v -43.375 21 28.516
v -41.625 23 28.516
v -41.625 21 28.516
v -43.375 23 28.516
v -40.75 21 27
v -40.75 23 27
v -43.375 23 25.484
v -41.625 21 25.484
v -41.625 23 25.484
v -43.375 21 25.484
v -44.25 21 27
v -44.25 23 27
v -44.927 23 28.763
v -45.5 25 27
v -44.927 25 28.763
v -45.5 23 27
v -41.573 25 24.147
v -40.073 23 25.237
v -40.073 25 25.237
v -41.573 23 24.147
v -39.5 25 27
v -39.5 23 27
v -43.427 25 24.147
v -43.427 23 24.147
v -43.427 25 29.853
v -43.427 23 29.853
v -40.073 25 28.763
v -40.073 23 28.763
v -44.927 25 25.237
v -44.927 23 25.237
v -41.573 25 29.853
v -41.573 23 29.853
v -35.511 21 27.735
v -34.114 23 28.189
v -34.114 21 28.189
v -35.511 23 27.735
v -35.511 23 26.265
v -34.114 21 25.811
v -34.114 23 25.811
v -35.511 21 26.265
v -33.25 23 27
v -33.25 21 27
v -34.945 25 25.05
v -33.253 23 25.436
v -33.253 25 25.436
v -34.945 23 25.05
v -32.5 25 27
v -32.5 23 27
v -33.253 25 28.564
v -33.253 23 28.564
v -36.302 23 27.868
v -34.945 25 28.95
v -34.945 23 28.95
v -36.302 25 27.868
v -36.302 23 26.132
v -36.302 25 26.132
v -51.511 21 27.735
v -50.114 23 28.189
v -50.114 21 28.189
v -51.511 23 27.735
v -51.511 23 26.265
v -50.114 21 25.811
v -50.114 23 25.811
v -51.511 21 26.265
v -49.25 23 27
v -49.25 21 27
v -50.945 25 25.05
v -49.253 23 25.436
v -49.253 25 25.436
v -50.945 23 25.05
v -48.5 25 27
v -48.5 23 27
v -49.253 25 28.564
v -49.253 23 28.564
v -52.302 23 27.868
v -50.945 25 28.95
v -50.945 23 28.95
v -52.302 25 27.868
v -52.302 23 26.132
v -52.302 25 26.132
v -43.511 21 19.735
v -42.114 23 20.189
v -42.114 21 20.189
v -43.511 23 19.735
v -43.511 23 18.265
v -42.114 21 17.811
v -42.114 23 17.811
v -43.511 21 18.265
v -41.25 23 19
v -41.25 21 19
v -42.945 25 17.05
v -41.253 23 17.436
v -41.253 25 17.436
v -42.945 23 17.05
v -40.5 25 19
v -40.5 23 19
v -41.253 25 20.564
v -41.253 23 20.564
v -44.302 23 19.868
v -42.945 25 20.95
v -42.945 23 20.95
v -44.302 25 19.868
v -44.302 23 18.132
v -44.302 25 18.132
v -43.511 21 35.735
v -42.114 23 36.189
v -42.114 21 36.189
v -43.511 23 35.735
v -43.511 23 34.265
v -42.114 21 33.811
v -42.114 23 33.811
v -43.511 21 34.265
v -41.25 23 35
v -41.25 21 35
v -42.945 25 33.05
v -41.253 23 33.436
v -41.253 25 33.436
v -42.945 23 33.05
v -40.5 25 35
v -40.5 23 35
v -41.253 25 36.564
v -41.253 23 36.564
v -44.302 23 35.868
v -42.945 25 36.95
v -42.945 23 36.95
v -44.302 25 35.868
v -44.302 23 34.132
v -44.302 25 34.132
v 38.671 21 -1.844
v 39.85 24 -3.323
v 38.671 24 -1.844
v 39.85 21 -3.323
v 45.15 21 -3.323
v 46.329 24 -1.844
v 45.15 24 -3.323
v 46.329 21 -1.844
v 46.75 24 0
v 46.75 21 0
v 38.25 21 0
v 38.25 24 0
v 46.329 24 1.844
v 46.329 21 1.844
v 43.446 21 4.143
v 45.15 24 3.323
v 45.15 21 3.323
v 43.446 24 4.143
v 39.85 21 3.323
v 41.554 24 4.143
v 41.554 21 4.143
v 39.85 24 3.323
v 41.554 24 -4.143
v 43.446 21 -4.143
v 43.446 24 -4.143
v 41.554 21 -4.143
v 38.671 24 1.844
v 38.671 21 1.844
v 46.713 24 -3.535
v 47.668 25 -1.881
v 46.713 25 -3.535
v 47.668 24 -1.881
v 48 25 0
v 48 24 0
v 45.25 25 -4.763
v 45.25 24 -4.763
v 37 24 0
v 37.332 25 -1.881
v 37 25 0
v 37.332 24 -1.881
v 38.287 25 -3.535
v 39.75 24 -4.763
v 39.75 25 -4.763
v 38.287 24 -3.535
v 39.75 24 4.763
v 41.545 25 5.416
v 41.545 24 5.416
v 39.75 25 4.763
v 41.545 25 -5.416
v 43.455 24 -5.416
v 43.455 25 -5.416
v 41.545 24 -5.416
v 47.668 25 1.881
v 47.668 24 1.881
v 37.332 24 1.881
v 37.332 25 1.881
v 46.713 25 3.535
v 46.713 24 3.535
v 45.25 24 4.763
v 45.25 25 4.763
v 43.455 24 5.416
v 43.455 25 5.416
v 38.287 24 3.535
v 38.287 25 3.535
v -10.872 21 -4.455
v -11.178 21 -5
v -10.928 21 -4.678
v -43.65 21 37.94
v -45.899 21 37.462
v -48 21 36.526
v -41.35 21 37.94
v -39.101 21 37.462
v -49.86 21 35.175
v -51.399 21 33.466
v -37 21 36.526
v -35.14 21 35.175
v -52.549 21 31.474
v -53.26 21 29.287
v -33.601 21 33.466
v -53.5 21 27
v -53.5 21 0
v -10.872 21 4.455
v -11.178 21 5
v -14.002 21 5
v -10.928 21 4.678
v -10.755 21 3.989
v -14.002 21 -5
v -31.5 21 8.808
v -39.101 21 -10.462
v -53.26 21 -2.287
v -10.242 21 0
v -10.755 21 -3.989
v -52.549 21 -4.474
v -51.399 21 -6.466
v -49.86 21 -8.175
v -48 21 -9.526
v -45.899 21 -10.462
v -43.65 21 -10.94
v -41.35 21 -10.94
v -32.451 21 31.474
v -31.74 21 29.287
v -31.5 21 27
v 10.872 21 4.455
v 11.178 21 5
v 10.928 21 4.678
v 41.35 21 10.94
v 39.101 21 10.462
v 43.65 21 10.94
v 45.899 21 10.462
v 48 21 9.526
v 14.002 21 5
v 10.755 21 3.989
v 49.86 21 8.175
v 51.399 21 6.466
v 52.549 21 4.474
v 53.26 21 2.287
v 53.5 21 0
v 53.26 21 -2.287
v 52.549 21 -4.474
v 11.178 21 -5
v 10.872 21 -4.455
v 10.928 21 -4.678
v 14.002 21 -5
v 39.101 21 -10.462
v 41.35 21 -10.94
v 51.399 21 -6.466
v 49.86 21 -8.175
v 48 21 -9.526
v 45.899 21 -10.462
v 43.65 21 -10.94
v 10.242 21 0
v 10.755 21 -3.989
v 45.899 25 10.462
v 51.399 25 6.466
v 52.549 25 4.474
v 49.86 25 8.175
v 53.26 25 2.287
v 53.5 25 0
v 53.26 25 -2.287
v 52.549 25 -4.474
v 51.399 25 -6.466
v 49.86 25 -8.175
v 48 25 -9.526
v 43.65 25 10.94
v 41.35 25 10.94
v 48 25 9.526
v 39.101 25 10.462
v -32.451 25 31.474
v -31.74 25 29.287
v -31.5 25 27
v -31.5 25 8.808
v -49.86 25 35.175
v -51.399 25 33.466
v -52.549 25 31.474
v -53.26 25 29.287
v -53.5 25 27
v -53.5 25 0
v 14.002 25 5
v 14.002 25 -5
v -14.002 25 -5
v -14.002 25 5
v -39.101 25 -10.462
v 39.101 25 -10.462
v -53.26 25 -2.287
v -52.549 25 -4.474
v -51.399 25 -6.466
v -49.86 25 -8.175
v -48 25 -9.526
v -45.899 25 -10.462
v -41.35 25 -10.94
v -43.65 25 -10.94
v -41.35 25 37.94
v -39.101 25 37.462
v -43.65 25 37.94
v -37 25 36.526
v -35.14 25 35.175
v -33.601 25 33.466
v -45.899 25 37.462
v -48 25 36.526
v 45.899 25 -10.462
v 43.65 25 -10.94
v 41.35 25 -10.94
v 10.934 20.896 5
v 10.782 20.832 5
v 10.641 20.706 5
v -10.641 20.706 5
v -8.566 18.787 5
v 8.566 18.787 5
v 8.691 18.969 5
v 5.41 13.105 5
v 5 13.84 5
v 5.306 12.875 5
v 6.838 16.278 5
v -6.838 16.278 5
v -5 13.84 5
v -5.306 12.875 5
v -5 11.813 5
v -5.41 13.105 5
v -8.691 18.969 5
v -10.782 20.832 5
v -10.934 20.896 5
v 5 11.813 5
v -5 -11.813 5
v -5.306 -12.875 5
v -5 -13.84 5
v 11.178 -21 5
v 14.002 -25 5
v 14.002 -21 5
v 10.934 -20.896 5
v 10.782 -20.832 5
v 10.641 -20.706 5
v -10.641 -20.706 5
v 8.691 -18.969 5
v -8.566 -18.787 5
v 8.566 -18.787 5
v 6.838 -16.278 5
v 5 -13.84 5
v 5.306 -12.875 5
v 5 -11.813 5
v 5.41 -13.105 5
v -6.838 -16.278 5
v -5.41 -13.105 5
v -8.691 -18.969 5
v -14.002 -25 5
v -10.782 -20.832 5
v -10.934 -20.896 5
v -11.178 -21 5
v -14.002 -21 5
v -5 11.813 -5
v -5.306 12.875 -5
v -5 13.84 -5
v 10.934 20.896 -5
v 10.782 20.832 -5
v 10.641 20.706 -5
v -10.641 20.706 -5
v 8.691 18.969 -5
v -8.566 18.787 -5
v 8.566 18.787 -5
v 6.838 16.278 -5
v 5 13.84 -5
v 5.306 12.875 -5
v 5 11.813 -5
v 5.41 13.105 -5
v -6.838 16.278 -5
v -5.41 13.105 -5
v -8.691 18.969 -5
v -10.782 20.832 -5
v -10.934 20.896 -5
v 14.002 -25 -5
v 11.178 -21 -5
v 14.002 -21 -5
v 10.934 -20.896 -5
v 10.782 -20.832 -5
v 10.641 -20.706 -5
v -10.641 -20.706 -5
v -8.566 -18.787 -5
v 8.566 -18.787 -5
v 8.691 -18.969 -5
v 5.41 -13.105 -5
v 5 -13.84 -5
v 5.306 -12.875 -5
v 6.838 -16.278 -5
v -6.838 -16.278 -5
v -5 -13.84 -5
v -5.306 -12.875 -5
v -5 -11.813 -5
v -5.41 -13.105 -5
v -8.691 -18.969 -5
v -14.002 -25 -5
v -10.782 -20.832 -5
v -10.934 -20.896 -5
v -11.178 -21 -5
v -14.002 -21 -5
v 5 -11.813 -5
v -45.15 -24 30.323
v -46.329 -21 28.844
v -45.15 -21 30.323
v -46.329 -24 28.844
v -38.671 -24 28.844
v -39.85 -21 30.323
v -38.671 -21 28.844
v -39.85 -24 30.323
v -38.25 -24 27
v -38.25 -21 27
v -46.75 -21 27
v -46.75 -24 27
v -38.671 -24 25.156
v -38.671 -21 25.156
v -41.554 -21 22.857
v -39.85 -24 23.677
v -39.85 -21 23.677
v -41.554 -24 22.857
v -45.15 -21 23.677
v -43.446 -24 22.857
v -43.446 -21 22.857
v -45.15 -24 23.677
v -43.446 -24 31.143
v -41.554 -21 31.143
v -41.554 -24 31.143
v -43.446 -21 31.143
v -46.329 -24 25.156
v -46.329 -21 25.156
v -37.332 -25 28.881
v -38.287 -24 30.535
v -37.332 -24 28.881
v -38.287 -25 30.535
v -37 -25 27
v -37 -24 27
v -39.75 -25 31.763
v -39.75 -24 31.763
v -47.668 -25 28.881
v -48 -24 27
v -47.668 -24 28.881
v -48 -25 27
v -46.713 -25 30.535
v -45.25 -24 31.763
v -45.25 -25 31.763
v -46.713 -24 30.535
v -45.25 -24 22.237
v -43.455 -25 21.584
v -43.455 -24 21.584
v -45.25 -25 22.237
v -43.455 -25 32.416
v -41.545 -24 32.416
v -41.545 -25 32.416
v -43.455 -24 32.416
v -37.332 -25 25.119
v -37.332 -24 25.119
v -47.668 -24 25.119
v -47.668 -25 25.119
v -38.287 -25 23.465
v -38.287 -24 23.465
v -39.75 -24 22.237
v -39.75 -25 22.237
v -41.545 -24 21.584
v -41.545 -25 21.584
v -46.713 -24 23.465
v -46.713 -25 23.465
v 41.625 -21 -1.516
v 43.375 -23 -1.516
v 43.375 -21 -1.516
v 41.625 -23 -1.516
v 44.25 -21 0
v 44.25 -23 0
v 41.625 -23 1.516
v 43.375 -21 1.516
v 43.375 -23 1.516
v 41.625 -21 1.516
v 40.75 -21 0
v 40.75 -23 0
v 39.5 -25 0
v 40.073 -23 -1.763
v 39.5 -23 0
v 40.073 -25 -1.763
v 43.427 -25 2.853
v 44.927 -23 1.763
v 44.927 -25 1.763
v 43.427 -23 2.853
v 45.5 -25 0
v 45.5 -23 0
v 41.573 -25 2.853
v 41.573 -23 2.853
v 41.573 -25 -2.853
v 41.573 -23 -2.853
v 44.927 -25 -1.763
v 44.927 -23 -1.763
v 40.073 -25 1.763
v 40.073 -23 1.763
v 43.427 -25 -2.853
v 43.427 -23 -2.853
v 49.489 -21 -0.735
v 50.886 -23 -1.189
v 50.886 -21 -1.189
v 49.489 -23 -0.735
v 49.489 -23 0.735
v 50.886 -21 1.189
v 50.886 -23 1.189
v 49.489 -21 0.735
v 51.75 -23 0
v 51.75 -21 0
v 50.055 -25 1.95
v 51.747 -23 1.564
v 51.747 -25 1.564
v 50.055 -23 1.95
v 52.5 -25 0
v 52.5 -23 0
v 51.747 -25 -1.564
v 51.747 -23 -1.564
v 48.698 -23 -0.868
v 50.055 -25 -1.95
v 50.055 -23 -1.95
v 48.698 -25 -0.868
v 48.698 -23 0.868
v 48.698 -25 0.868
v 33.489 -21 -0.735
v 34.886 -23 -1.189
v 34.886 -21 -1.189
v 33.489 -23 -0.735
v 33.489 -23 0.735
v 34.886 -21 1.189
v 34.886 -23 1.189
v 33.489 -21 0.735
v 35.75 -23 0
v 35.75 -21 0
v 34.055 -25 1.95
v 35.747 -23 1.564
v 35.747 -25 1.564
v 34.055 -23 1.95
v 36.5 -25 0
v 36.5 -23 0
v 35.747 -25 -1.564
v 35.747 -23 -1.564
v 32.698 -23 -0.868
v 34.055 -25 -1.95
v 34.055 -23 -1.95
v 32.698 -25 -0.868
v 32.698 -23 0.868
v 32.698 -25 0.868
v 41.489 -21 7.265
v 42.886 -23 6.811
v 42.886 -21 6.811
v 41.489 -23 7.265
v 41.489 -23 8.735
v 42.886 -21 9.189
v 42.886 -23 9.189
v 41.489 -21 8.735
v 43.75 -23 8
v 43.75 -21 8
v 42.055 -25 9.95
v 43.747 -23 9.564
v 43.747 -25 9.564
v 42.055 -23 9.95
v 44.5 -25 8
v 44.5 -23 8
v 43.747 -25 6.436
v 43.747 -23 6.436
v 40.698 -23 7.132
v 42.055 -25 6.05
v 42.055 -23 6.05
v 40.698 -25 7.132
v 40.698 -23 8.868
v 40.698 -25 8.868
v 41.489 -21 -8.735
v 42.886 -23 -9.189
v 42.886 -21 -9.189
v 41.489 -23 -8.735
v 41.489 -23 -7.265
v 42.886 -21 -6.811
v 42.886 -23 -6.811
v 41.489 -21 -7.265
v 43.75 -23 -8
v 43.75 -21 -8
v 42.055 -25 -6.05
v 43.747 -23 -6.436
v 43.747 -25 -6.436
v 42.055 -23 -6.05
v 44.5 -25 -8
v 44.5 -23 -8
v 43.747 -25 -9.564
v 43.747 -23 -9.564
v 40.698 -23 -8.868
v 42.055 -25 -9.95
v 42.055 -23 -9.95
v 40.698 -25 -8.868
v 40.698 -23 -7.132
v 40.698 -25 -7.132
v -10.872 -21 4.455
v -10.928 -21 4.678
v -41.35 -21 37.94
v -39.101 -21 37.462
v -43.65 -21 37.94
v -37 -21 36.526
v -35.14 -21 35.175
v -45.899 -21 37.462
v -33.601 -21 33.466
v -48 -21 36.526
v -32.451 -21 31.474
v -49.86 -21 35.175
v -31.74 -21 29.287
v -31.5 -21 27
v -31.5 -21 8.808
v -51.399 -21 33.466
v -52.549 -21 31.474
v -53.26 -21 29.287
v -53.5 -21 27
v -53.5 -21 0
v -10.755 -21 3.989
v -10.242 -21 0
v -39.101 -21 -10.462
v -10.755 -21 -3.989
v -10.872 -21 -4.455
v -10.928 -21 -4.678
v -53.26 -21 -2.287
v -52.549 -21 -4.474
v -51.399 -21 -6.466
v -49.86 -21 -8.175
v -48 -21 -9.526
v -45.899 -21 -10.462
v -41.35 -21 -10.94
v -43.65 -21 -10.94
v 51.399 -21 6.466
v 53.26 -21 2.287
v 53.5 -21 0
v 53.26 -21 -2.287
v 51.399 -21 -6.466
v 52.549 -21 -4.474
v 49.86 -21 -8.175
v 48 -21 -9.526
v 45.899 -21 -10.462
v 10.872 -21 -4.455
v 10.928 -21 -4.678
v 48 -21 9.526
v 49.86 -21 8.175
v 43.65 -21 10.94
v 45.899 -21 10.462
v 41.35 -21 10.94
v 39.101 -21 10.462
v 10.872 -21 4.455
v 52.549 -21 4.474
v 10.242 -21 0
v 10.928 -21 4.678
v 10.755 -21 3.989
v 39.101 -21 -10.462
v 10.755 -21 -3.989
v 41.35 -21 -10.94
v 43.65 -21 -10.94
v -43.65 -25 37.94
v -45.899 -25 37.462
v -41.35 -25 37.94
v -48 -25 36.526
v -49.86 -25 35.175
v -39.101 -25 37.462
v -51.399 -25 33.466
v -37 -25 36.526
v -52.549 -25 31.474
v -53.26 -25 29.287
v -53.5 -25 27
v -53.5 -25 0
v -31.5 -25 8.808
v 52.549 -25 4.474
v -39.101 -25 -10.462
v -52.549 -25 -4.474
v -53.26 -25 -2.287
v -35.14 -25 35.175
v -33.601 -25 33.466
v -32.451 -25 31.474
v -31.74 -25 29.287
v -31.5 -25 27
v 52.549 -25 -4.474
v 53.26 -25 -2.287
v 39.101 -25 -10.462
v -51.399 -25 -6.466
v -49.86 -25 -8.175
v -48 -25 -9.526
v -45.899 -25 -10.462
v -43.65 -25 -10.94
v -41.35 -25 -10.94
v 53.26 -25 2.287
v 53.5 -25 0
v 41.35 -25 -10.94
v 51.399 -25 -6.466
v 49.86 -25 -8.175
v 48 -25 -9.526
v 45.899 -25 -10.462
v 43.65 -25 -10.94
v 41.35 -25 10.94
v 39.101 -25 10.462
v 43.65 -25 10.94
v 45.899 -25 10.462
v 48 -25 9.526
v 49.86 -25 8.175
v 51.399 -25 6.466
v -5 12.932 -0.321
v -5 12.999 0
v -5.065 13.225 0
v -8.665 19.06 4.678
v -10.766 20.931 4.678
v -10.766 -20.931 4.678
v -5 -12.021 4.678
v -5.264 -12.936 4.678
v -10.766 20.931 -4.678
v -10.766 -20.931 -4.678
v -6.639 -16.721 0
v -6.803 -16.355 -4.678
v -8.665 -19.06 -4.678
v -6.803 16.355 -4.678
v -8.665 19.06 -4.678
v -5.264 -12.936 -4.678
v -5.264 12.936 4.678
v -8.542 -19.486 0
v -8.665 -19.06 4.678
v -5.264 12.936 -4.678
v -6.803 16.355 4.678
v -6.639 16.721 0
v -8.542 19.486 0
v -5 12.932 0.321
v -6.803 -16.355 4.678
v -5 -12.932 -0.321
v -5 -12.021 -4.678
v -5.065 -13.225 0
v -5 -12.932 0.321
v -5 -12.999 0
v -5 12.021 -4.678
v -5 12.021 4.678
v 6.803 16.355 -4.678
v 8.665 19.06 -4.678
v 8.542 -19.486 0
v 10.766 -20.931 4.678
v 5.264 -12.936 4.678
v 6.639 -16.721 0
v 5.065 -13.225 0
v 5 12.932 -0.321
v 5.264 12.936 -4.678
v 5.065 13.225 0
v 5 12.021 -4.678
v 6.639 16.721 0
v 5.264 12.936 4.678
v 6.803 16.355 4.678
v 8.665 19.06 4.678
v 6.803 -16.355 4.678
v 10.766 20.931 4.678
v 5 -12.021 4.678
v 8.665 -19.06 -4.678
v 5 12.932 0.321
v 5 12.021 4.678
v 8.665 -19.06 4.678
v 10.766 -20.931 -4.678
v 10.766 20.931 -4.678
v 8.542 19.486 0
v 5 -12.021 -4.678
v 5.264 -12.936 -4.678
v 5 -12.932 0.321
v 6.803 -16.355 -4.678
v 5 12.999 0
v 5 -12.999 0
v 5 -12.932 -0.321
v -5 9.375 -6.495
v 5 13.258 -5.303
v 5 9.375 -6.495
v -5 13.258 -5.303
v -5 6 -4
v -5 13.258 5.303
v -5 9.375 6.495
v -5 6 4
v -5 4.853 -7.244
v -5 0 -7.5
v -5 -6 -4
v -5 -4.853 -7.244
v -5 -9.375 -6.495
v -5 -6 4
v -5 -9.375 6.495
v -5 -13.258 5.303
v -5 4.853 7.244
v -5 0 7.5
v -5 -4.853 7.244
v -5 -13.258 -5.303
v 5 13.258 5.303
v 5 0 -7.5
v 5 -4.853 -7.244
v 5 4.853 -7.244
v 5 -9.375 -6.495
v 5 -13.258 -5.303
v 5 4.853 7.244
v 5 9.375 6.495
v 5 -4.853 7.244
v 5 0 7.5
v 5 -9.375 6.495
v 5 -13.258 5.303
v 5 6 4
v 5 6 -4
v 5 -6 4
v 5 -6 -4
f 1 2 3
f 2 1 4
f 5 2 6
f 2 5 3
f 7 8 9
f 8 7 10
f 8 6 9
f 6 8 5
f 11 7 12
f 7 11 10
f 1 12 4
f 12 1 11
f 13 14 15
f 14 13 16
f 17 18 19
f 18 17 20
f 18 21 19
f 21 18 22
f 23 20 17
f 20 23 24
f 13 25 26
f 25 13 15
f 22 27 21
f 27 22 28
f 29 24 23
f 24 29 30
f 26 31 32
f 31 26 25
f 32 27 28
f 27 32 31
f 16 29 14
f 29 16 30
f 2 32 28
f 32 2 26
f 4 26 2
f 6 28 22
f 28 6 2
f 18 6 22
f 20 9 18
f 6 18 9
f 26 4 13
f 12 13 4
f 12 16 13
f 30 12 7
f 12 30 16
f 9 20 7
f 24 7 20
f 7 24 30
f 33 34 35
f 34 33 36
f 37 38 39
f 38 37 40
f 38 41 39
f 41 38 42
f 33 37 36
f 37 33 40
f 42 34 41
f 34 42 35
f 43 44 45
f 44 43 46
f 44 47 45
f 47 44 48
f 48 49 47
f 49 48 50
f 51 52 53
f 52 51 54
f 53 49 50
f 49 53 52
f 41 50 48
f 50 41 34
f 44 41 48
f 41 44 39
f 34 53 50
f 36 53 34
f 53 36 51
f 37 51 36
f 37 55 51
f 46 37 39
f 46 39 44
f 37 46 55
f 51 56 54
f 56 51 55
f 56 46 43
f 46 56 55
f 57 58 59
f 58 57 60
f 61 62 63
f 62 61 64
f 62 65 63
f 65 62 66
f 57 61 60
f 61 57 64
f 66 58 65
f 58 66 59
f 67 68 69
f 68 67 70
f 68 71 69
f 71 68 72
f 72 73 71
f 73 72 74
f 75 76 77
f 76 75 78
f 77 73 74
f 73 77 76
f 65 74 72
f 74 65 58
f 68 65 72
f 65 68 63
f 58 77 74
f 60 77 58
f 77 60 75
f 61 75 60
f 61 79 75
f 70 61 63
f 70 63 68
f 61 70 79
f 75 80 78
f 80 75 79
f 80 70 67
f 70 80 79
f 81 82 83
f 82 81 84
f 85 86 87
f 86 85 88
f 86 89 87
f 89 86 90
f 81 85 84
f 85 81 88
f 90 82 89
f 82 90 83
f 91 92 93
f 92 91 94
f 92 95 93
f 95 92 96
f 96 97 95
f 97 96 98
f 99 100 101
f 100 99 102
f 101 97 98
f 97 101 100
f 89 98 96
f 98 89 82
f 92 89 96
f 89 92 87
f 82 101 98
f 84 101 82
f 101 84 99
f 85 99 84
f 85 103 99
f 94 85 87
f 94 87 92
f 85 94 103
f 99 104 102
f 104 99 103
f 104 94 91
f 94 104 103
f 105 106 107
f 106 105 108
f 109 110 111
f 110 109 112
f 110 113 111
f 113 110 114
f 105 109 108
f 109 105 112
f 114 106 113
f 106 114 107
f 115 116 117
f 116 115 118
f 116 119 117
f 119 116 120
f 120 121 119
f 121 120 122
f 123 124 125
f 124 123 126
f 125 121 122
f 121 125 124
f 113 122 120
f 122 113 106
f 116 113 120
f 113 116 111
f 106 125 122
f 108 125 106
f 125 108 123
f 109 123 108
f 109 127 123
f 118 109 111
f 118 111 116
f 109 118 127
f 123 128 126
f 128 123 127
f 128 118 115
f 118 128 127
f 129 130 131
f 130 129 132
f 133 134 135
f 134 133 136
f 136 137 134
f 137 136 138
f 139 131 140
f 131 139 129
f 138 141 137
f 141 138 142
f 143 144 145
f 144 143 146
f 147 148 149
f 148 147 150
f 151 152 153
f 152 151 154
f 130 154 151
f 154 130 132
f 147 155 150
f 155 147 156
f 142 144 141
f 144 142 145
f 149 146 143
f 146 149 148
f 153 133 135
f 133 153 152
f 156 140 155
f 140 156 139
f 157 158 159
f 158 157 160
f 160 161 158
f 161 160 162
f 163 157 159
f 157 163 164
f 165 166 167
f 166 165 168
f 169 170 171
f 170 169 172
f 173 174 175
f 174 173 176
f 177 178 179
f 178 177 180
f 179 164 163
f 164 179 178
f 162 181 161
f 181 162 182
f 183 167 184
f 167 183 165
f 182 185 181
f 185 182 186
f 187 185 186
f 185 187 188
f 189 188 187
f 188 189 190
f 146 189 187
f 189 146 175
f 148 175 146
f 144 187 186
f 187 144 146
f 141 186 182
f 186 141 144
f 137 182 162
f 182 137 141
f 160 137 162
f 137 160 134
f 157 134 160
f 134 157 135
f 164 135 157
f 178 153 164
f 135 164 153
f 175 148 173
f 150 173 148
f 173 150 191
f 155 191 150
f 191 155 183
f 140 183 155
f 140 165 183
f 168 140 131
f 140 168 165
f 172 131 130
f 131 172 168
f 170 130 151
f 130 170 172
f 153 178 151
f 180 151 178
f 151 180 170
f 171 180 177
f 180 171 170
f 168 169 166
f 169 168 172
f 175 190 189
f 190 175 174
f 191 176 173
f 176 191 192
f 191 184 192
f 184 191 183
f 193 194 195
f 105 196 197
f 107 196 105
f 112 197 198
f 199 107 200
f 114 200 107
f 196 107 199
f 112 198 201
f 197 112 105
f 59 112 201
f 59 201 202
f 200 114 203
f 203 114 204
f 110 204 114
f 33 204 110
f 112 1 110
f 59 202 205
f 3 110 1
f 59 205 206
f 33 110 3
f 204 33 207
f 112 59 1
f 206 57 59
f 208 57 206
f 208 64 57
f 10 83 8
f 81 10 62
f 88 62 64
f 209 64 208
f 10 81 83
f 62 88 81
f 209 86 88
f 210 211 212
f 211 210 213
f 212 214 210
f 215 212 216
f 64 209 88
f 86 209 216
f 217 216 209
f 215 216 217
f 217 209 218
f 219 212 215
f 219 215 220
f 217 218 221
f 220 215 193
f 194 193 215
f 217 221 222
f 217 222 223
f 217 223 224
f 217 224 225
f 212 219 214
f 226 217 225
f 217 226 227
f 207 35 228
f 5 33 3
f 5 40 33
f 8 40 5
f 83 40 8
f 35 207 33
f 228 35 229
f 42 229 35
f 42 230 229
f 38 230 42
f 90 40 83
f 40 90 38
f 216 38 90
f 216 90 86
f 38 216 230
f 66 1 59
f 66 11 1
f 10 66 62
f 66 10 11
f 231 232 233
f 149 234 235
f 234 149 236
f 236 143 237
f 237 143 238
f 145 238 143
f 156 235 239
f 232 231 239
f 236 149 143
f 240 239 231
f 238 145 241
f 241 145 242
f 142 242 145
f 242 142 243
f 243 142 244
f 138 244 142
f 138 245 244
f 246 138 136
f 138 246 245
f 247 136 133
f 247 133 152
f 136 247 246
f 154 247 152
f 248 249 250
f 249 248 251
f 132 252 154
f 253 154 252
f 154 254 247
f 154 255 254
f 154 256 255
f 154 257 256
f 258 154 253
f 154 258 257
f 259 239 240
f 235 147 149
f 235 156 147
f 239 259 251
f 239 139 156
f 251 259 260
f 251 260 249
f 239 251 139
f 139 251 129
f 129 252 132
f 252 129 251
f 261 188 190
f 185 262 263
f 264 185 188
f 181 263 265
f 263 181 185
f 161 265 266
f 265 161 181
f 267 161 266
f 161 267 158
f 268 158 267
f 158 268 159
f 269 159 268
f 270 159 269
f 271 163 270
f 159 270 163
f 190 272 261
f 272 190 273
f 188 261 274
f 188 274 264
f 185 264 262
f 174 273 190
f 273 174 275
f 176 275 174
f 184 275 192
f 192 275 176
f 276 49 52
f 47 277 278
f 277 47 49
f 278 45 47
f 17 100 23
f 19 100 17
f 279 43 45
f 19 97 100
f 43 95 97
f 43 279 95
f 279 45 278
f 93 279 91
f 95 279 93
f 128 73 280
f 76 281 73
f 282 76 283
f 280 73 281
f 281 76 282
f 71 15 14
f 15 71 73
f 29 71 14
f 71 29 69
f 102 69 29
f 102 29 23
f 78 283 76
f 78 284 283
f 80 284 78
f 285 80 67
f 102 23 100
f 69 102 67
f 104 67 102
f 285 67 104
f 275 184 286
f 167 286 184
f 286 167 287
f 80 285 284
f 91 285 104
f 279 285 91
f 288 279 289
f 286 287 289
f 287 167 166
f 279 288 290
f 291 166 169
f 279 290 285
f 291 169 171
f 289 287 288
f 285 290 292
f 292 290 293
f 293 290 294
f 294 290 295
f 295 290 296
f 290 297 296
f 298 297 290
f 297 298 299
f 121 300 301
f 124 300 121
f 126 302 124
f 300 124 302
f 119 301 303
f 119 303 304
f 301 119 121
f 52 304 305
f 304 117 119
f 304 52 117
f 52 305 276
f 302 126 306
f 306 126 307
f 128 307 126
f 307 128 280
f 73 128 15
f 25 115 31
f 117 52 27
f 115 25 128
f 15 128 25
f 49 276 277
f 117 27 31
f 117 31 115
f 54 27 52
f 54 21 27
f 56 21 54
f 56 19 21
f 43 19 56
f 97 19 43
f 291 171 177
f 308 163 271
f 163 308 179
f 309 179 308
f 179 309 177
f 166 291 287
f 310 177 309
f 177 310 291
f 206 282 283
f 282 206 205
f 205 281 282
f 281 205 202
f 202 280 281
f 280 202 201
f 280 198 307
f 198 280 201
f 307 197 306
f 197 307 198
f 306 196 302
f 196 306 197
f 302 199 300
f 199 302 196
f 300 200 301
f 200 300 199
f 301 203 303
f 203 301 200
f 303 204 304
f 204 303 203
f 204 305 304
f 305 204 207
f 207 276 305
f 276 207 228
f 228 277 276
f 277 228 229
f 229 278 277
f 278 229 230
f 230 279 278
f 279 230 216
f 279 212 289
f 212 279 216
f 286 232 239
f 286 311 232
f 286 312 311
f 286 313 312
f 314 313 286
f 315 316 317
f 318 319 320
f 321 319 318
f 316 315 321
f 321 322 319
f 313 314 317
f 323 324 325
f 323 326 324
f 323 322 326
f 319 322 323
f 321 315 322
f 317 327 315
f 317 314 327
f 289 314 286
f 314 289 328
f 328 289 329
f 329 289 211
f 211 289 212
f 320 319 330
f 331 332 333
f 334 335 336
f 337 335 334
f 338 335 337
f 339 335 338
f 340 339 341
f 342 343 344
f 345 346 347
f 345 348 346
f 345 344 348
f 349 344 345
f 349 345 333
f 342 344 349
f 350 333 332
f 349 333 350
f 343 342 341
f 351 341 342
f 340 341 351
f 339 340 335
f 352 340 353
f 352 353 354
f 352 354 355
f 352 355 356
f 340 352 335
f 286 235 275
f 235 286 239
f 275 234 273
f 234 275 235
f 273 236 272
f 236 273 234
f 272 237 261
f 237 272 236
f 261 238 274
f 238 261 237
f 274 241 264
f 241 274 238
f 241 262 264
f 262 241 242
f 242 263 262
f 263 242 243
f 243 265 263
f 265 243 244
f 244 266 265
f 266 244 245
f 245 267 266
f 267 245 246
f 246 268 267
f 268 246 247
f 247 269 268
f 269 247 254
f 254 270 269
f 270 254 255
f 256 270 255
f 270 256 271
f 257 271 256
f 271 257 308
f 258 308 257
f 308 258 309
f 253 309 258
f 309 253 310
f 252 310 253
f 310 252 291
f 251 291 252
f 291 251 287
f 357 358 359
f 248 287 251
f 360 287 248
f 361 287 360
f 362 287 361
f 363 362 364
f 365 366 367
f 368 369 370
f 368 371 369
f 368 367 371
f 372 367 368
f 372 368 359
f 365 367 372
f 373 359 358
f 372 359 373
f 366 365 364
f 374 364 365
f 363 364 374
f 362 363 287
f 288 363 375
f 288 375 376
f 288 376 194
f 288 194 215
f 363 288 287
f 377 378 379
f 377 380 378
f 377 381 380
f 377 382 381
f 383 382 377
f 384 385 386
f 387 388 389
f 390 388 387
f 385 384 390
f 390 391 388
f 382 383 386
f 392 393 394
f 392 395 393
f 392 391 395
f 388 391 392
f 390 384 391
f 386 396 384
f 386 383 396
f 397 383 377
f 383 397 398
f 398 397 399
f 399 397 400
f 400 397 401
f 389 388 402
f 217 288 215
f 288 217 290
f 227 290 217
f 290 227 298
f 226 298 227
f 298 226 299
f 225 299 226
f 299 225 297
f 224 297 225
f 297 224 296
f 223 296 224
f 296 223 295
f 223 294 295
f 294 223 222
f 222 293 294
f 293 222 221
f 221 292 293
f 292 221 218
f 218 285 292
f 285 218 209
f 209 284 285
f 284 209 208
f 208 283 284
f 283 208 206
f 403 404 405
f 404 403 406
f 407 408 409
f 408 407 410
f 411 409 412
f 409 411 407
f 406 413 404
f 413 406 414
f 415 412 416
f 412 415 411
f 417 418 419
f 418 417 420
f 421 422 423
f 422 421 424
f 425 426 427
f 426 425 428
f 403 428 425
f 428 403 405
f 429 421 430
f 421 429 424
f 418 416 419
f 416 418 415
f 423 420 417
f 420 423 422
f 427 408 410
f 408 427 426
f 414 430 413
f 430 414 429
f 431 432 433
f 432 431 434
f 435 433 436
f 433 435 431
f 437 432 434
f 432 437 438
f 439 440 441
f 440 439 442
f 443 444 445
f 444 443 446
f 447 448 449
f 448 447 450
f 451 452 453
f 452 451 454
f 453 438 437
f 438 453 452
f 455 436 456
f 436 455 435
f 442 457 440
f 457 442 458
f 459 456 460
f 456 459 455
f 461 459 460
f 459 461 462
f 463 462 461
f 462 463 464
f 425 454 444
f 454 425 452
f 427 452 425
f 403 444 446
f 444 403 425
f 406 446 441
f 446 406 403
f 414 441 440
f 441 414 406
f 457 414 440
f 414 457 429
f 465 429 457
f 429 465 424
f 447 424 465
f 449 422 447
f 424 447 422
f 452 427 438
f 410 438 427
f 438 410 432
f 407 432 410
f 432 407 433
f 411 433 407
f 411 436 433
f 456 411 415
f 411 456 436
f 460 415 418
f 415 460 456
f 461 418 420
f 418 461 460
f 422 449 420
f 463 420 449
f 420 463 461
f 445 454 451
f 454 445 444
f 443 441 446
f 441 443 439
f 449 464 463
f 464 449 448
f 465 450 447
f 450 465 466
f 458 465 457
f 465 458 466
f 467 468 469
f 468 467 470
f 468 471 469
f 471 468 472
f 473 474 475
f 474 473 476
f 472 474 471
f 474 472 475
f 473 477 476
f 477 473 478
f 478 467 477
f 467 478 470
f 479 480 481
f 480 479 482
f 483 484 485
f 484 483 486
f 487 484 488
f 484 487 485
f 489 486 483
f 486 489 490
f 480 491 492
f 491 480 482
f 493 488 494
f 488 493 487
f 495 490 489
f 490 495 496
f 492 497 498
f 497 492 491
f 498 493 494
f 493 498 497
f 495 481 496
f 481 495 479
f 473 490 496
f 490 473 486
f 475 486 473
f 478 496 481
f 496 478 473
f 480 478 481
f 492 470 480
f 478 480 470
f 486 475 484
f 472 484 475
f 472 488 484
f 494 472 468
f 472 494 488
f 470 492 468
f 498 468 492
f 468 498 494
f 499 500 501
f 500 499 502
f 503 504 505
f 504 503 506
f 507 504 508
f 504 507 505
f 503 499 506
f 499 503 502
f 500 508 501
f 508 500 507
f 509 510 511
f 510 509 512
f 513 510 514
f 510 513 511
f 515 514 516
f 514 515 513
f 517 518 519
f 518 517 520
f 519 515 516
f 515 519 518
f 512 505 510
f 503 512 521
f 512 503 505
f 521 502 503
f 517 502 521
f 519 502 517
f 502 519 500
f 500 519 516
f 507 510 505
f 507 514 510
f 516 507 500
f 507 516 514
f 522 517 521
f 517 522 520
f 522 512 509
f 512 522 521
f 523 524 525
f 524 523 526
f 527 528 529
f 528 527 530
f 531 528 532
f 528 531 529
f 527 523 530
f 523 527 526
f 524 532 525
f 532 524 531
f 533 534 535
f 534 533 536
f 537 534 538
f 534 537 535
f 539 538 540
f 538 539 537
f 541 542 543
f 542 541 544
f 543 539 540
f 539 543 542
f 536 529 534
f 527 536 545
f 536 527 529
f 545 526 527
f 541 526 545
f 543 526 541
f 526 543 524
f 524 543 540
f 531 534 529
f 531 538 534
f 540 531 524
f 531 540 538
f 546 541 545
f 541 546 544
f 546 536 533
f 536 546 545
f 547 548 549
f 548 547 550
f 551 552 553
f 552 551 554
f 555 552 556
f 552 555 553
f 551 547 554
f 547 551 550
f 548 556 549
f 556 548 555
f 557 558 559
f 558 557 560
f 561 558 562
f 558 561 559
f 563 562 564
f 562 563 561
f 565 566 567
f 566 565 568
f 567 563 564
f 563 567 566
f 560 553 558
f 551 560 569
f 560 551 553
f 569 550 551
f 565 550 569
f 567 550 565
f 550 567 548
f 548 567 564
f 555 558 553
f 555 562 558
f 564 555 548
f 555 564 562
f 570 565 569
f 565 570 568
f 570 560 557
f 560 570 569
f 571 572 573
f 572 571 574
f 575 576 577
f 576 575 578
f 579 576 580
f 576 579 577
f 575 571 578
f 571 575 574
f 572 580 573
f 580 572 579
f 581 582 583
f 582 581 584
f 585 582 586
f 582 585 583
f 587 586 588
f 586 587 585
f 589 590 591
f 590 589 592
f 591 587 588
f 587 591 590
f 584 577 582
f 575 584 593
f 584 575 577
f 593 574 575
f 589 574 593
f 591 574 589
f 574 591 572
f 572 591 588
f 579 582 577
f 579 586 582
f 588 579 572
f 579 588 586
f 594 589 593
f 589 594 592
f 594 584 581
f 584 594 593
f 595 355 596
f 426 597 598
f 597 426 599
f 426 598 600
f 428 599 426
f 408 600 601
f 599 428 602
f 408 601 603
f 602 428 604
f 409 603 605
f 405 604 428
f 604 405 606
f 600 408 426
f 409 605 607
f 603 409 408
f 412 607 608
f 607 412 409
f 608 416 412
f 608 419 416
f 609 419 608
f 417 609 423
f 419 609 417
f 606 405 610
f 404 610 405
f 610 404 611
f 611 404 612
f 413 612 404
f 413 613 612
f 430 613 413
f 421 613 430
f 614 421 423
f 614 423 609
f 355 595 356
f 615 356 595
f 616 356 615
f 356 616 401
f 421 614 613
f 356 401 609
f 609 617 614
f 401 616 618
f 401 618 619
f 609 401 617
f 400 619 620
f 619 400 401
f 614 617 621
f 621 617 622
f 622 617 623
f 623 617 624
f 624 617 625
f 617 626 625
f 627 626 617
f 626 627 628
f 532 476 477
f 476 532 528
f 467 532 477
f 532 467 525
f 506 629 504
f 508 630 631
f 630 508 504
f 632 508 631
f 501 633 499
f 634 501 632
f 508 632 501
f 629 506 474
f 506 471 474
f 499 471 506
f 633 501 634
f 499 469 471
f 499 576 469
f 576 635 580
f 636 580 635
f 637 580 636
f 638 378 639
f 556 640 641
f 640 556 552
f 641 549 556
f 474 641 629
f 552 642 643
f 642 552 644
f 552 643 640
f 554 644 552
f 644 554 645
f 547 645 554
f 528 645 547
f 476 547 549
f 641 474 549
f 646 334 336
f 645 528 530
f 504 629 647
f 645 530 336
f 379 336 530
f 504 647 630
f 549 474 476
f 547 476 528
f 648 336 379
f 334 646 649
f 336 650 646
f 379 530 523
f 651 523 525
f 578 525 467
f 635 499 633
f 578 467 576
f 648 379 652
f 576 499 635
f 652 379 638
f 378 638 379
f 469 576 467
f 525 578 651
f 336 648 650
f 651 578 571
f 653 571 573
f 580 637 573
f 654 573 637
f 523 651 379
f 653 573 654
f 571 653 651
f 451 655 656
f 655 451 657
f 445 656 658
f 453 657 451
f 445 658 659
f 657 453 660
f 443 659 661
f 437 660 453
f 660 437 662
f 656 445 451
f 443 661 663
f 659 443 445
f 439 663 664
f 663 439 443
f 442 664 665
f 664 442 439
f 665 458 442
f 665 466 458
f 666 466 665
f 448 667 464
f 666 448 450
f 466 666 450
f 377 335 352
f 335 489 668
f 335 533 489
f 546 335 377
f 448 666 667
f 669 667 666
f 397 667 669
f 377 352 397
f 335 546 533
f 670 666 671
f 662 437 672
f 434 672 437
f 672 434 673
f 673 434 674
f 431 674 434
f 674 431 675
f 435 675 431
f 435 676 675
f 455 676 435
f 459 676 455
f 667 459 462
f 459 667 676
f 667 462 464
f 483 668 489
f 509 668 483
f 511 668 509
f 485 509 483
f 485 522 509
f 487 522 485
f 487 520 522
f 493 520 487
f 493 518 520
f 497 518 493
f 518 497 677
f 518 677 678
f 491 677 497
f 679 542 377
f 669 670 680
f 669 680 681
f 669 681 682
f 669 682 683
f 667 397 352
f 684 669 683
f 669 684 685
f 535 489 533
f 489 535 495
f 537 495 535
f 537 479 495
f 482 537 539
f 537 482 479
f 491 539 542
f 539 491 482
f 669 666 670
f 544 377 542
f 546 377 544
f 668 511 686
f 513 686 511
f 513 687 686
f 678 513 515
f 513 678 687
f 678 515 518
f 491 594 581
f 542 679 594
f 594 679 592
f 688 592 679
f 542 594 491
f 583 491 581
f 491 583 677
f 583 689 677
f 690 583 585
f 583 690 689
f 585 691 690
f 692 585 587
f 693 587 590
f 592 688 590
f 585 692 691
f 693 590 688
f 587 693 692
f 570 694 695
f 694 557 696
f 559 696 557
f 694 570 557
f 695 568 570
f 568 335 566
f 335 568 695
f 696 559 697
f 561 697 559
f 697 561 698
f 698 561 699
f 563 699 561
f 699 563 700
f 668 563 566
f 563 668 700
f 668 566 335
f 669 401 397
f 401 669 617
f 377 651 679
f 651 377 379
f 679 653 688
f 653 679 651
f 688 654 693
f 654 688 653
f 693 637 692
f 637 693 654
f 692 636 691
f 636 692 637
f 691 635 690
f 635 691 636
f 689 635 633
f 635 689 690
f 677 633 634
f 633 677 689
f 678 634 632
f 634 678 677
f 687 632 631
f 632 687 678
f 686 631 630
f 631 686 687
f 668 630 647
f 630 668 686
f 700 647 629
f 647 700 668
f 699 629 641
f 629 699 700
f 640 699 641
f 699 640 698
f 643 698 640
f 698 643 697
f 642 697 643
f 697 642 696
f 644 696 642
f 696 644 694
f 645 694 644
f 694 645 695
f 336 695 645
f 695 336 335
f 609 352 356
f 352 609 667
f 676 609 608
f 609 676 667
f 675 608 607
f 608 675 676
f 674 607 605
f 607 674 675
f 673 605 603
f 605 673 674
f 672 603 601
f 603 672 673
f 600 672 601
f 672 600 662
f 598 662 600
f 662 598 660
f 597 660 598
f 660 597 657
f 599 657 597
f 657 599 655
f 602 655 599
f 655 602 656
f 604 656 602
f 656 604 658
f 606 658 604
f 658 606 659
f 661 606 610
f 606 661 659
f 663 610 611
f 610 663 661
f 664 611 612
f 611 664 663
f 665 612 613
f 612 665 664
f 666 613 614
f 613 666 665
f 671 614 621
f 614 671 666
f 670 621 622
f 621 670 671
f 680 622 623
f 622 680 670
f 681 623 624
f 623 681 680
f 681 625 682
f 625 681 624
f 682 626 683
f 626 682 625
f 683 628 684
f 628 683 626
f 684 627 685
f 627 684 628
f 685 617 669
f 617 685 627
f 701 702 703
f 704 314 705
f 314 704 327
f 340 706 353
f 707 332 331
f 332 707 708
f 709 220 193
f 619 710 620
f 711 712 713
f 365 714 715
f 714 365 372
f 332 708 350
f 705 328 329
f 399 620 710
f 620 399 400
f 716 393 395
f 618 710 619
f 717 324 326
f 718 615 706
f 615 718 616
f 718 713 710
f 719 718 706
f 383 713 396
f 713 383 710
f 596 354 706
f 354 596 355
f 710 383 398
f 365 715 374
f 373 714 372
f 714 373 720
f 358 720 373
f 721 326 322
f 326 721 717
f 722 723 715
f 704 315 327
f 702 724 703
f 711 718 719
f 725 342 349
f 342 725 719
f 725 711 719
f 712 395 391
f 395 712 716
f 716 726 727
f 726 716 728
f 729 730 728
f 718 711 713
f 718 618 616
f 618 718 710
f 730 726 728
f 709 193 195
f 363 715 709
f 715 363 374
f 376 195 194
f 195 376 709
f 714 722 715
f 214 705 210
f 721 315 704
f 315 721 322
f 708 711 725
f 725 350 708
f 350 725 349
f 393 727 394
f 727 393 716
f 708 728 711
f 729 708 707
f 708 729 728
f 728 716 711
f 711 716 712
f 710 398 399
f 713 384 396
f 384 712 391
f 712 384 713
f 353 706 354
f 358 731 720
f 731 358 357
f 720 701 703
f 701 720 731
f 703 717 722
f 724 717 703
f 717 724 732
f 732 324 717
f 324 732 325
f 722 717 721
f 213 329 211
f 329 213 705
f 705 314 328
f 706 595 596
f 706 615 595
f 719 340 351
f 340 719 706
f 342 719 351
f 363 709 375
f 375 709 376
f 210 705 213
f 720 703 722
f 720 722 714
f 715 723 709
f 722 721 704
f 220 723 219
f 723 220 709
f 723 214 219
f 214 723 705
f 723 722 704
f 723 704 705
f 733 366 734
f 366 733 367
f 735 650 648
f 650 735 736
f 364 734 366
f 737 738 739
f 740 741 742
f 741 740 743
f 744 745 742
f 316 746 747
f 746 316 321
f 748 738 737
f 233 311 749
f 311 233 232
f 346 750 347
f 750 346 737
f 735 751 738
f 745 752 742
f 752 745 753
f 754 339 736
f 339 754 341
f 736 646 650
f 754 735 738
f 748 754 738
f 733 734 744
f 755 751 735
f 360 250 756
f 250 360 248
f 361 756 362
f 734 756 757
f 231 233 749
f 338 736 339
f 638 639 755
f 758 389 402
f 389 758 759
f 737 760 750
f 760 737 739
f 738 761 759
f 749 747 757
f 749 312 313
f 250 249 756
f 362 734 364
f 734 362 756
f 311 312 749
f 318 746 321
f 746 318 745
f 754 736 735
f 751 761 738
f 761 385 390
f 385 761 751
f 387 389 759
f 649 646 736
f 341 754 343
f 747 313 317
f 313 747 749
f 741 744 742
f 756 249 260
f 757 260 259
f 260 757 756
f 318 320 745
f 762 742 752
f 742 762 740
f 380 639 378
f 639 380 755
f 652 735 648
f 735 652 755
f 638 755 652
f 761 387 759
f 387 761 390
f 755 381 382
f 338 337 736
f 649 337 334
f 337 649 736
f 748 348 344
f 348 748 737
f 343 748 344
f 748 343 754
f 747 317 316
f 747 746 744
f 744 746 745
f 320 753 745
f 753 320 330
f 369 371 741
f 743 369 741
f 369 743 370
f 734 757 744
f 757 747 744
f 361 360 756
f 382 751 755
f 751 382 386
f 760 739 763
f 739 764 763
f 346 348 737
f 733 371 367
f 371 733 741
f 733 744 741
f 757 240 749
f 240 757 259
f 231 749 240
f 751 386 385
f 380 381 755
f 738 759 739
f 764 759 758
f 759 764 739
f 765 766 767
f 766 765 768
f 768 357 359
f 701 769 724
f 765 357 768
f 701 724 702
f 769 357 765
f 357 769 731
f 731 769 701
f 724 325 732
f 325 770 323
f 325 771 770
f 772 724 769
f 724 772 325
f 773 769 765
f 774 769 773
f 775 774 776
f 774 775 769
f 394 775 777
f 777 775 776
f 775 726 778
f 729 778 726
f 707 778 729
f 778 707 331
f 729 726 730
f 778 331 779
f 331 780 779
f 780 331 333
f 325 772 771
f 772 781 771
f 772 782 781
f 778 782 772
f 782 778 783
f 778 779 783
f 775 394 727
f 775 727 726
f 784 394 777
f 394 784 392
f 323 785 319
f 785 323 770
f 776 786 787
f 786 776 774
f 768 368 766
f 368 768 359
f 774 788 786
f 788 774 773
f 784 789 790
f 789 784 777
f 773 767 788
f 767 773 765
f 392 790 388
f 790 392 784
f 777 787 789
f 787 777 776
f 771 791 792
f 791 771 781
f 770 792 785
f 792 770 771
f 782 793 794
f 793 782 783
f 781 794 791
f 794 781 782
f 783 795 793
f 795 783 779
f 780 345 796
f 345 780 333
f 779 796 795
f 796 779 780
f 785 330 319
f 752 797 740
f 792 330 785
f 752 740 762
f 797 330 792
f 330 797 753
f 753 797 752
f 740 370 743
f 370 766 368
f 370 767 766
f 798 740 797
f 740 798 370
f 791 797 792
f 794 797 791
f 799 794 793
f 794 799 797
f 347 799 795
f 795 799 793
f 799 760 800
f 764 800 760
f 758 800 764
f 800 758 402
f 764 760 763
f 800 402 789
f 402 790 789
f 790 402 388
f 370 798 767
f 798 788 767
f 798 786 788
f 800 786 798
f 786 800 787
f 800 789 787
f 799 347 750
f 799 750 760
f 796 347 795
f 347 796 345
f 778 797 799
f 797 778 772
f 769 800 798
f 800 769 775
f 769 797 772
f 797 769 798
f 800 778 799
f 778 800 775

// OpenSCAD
// file: lib/misc.scad
// Simple primatives for generating holes

module hex(side,t){
    s = side/2;
    h = sqrt(side*side-s*s);
    pts = [
        [2*s,0],
        [s,h],
        [-s,h],
        [-2*s,0],
        [-s,-h],
        [s,-h]
    ];
    linear_extrude(height=t){
        polygon(pts);
    }
}


module M3(t){
    dia = 3.5;
    sdia = 6;
    cylinder(3*t, d=dia, center=true);  // M2
    translate([0,0,2]) cylinder(3*t, d=sdia, center=false);  // screw driver
}

module M2(t){
    dia = 2.5;
    sdia = 4;
    cylinder(3*t, d=dia, center=true);  // M2
    translate([0,0,2]) cylinder(3*t, d=sdia, center=false);  // screw driver
}


/* module holes(t){
    // M3 3.3 mm
    M3(t);

    // M2 2.3 mm
    // dia = 2.3;
    translate([8,0,0]) M2(t);
    translate([-8,0,0]) M2(t);
    translate([0,8,0]) M2(t);
    translate([0,-8,0]) M2(t);
}

module pulley(dia=24, thick=3, cen=false){
    cylinder(thick,d=dia,center=cen);
} */
// file: lib/robotis_parts.scad
use <misc.scad>;

///////////////////////
// These are STL models I found on line
///////////////////////

module ax12(){
    // sort of center mass
    color("gray") translate([-70,-210,-180]) import("parts/AX-12A.STL");
}


module f2(){
    // U bracket
    // sort of center mass
    color("lightgray") translate([0,0,0]) import("parts/F2.stl");
}

module f3(){
    // End cap bracket
    // sort of center mass
    color("lightgray") translate([0,0,0]) import("parts/F3.stl");
}

/////////////////////
// These are some interfaces I made for the parts
////////////////////

module pulleyHole(){
    cylinder(20, d=8.5, center=true);  // hub
    translate([0,0,3]) cylinder(20, d=11);  // 3mm?
}

module holes(t){
    // M3 3.3 mm
    M3(t);

    // M2 2.3 mm
    /* dia = 2.3; */
    translate([8,0,0]) M2(t);
    translate([-8,0,0]) M2(t);
    translate([0,8,0]) M2(t);
    translate([0,-8,0]) M2(t);
}

// does anything use this?????
/* module pulley(dia=24, thick=3, cen=false){
    cylinder(thick,d=dia,center=cen);
} */

module servo_mnt(){
    d = 2.5;
    w = 22; // center servo
    l = 35; // center servo
    s = 38.5-2.5;
    h=20;

    translate([32,-20,-1]) cube([20,40,h],center=false);
    translate([2.5,-w/2,-1])cube([l,w,h],center=false);

    // bottom holes
    translate([0,8,-1]) cylinder(h,d=d);
    translate([0,-8,-1]) cylinder(h,d=d);

    // right holes
    translate([5.5,-27/2,-1]) cylinder(h,d=d);
    translate([5.5+8,-27/2,-1]) cylinder(h,d=d);
    translate([5.5+16,-27/2,-1]) cylinder(h,d=d);
    translate([5.5+24,-27/2,-1]) cylinder(h,d=d);

    // left holes
    translate([5.5,27/2,-1]) cylinder(h,d=d);
    translate([5.5+8,27/2,-1]) cylinder(h,d=d);
    translate([5.5+16,27/2,-1]) cylinder(h,d=d);
    translate([5.5+24,27/2,-1]) cylinder(h,d=d);
}
// main file
//$fn = 50;

use <lib/robotis_parts.scad>;
use <lib/misc.scad>;


module tibiaSupt(L, thick, rev=false){
    // makes the bar on the left/right of the tibbia
    // everything is drawn in 2D and then extruded into 3D
    angle = 0;
    dia = 22;
    difference(){
    translate([-L/2,0,0]) linear_extrude(thick){
        hull(){
            circle(d=dia);  // servo head
            translate([L/3,0,0]) circle(d=10);
        }
        if (rev){
            rotate([0,0,angle]) {
                translate([0,-(dia+5)/2,0]) square([dia,dia+5], center=true);
                translate([0,-dia-5,0]) circle(d=dia);
            }
        }
        else {
            rotate([0,0,angle]) {
                translate([0,(dia+5)/2,0]) square([dia,dia+5], center=true);
                translate([0,dia+5,0]) circle(d=dia);
            }
        }
        translate([L/3,-5,0]) square([L/3,10]);
        translate([2*L/3,0,0]) hull(){
            circle(d=10);
            translate([L/3,0,0]) circle(d=dia); // servo head
        }
    }
    if (rev){
        translate([-L/2-(dia+5)*sin(angle),-(dia+5)*cos(angle),0]) holes(2);  // hub
        translate([L/2,0,0]) pulleyHole();  // servo head
    }
    else {
        translate([-L/2-(dia+5)*sin(angle),(dia+5)*cos(angle),0]) pulleyHole();  // hub
        translate([L/2,0,0]) holes(2);  // servo head
    }
}
}

module tibia(L=85){
    // hub outter: 10 mm
    // hub inner: 8 mm
    // hub thickness inner ring: 2 mm
    thick = 4;

    // middle support bar and wiring channel
    color("SkyBlue") difference(){
        union(){
            translate([0,21,0]) rotate([-90,0,0]) tibiaSupt(L, thick, true);
            translate([0,-21,0]) rotate([90,0,0]) tibiaSupt(L, thick);

            difference(){
                cube([L/3,42,10], center=true);
                translate([-L/3/2,0,0]) scale([.5,1,1]) sphere(d=45);
                translate([L/3/2,0,0]) scale([.5,1,1]) sphere(d=45);
            }

            rotate([0,90,0]) scale([1,2.5,1]) cylinder(h=10,d=15, center=true);
        }
        cube([20,12,8], center=true);
    }
}

tibia();
//tibiaSupt(85, 4, true);
